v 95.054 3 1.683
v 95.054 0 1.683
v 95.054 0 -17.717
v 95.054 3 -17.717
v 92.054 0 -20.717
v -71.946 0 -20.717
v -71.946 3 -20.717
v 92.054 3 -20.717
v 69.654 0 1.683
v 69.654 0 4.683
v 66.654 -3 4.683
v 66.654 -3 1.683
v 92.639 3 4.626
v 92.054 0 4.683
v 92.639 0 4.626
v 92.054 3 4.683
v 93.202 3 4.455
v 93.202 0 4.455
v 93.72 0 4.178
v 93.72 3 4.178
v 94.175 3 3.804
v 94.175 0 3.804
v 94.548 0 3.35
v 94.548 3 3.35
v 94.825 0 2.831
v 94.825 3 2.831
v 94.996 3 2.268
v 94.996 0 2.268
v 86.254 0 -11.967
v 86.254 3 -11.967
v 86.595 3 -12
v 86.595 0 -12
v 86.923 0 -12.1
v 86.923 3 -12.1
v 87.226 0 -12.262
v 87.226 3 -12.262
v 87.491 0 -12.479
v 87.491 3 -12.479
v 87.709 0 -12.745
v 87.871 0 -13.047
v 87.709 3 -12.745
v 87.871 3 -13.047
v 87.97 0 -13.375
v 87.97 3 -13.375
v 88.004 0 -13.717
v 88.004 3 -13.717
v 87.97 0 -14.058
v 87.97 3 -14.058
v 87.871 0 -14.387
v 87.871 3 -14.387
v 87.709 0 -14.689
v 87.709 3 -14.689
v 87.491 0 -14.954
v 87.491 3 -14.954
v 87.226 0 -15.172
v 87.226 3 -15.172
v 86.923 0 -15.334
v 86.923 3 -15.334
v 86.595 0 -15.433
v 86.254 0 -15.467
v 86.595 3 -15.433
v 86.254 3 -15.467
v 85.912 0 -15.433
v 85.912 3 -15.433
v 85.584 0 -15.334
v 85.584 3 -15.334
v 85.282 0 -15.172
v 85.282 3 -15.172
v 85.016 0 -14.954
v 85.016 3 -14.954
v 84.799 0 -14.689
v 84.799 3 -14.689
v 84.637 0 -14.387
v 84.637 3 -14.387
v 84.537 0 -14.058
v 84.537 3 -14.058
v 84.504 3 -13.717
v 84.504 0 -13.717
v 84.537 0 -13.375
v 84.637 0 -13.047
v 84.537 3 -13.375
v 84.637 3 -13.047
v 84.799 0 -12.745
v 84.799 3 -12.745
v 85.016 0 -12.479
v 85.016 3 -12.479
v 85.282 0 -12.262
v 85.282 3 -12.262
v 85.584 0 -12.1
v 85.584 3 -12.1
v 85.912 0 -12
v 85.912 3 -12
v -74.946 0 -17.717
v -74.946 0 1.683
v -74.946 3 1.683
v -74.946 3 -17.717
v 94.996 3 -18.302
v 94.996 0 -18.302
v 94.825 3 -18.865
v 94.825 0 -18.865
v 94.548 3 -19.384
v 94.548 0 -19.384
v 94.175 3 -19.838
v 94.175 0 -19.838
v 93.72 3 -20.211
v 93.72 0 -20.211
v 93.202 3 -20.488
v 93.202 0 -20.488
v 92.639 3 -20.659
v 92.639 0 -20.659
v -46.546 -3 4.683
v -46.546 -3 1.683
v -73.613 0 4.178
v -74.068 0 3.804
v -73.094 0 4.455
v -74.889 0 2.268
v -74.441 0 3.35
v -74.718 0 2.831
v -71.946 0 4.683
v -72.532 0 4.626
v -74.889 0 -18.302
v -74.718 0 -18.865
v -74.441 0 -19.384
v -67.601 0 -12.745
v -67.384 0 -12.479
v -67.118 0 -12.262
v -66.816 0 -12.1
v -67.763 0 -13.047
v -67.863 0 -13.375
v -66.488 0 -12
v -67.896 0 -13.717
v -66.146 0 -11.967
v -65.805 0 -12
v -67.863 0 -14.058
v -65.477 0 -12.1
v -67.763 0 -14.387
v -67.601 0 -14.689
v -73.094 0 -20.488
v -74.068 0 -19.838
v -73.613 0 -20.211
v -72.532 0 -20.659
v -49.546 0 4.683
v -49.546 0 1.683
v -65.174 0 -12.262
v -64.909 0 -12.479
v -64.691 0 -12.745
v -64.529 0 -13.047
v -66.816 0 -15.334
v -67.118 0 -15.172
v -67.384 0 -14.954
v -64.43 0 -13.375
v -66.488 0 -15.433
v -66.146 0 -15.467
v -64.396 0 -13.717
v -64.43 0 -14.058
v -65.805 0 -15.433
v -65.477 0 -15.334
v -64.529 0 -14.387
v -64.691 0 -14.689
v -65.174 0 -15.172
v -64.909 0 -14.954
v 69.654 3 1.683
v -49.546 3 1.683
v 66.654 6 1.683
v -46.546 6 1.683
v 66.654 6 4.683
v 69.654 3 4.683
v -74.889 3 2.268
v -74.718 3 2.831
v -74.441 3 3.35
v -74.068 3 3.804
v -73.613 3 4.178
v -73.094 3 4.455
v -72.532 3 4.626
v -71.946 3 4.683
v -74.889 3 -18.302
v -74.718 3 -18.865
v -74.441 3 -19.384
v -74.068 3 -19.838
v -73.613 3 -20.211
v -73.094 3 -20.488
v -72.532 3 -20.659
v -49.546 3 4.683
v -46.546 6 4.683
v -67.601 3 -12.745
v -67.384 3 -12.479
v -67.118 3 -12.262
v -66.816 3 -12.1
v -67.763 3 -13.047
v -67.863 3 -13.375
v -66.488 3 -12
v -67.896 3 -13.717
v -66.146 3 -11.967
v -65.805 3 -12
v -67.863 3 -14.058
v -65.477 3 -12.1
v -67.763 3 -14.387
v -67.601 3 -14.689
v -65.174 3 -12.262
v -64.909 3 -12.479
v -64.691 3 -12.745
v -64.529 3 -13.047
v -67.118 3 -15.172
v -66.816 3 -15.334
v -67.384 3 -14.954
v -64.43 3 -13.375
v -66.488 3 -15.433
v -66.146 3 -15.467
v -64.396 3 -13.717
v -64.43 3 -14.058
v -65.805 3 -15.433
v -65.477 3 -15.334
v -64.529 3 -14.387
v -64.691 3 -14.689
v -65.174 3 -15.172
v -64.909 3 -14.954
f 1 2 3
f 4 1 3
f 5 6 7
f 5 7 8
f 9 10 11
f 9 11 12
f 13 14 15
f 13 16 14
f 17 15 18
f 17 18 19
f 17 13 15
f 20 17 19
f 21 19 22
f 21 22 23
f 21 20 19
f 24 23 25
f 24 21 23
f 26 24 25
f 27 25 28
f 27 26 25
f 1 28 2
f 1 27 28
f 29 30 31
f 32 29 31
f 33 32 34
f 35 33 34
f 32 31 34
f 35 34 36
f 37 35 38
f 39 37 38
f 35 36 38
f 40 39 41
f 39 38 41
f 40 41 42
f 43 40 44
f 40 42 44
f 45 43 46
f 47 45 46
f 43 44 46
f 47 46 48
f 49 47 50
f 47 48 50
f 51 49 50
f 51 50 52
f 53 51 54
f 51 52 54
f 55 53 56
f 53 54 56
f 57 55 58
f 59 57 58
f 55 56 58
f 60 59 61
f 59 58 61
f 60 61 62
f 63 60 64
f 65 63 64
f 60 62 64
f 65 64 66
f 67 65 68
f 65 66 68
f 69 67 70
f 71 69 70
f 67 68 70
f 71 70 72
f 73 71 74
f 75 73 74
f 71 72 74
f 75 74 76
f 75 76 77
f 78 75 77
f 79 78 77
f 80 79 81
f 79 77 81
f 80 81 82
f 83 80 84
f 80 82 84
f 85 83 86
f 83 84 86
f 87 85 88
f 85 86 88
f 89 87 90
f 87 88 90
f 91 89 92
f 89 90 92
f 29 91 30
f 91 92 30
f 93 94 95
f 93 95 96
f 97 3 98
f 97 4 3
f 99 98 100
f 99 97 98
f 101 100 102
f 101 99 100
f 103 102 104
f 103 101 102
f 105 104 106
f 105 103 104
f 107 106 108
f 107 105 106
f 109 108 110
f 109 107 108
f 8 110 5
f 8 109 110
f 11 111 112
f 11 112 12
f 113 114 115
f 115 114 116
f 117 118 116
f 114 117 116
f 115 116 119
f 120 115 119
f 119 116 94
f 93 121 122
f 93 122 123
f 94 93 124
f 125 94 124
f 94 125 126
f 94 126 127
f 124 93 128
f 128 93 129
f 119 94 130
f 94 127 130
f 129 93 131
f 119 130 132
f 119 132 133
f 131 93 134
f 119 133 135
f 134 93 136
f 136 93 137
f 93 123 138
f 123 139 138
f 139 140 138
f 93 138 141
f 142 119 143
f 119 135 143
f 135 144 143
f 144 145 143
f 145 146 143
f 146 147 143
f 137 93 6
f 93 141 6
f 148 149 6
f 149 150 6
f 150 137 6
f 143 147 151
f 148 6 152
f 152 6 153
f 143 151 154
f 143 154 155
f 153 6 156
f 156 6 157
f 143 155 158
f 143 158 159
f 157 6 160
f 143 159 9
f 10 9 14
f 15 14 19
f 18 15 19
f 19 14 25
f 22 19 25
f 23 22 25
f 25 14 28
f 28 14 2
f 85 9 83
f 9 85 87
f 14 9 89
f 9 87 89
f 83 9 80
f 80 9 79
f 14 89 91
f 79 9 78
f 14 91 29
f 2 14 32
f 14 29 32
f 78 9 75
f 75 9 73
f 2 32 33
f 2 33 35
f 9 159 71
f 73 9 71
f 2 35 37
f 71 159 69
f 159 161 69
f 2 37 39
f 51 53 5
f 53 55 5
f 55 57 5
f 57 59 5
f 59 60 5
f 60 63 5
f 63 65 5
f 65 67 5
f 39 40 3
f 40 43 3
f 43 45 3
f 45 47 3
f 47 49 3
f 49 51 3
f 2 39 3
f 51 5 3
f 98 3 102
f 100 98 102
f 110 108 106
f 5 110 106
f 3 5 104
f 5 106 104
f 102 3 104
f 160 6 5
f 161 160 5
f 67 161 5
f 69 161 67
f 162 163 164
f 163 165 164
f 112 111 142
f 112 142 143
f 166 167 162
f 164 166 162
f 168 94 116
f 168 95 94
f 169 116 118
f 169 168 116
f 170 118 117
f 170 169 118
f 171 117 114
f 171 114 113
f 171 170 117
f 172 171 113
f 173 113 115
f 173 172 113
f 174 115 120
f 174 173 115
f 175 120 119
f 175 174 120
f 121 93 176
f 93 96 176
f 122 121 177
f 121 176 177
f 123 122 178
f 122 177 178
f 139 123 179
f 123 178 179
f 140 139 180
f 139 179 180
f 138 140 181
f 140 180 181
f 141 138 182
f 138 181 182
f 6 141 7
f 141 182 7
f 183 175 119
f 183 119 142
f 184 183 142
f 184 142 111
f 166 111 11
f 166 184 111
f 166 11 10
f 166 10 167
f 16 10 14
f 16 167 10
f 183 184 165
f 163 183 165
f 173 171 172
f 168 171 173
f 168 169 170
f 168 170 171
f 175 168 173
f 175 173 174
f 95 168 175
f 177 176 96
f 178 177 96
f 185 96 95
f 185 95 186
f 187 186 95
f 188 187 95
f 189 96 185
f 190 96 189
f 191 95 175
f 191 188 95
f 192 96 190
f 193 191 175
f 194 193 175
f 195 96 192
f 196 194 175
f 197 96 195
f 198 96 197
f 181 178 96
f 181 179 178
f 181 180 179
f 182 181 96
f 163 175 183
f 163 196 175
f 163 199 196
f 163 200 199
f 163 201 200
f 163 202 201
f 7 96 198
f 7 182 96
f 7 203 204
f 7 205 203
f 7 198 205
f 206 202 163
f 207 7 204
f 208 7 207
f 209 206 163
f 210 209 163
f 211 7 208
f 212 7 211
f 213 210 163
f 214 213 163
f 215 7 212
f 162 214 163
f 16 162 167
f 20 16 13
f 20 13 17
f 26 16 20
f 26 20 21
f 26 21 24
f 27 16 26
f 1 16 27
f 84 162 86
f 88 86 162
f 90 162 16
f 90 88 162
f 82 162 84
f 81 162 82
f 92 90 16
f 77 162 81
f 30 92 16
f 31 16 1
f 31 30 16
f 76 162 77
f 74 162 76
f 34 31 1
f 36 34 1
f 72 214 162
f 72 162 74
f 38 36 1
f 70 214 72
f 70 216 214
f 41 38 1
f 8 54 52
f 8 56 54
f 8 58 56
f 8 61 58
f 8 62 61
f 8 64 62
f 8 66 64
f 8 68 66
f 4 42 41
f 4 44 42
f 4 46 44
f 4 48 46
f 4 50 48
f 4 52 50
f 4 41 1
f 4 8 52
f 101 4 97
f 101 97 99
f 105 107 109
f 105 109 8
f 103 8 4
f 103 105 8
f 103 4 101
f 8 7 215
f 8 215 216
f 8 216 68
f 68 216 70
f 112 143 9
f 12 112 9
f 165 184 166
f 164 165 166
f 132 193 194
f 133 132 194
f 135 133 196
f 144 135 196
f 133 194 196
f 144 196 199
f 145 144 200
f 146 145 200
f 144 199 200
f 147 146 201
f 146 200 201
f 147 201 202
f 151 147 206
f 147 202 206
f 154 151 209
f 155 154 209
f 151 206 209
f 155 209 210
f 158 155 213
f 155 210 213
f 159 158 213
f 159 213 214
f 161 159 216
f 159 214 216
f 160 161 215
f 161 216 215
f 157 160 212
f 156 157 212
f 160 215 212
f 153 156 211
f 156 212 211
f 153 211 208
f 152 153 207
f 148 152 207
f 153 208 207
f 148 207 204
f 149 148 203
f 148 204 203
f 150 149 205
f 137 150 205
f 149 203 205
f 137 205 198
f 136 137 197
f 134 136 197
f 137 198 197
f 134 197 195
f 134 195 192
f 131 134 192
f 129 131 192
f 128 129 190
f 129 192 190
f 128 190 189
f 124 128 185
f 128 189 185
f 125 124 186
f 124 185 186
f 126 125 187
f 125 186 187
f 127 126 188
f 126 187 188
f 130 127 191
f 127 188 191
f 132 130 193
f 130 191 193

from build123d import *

# Parameters (mm, degrees)
SKETCH1_W           = 170
SKETCH1_H           = 25.4
BOSS_EXTRUDE1_DEPTH = 3
FILLET1_R           = 3
SKETCH2_R           = 1.75
CUT_EXTRUDE1_DEPTH  = 3
SKETCH3_W           = 119.2
SKETCH3_H           = 9
BOSS_EXTRUDE2_DEPTH = 3
CHAMFER1_SIZE       = 3


with BuildPart() as part:
    # Sketch1 → Boss-Extrude1 (new body)
    with BuildSketch(Plane(origin=(0, 0, 0), x_dir=(1, 0, 0), z_dir=(0, 1, 0))):
        with Locations((10.053763441, 8.016845878)):
            Rectangle(SKETCH1_W, SKETCH1_H)
    extrude(amount=BOSS_EXTRUDE1_DEPTH)

    # Fillet1
    fillet1_edges = [part.edges().sort_by_distance(p)[0] for p in [
        (-74.946236559, 1.5, -20.716845878),
        (95.053763441, 1.5, -20.716845878),
        (95.053763441, 1.5, 4.683154122),
        (-74.946236559, 1.5, 4.683154122),
    ]]
    fillet(fillet1_edges, radius=FILLET1_R)

    # Sketch2 → Cut-Extrude1 (cut)
    with BuildSketch(Plane(origin=(0, 3, 0), x_dir=(1, 0, 0), z_dir=(0, 1, 0))):
        with Locations(Location((86.253763441, 13.716845878, 0), (0, 0, 270))):
            Circle(SKETCH2_R)
        with Locations(Location((-66.146236559, 13.716845878, 0), (0, 0, 270))):
            Circle(SKETCH2_R)
    extrude(amount=-CUT_EXTRUDE1_DEPTH, mode=Mode.SUBTRACT)

    # Sketch3 → Boss-Extrude2 (add)
    with BuildSketch(Plane.XY.offset(4.683154122)):
        with Locations((10.053763441, 1.5)):
            Rectangle(SKETCH3_W, SKETCH3_H)
    extrude(amount=-BOSS_EXTRUDE2_DEPTH)

    # Chamfer1
    chamfer1_edges = [part.edges().sort_by_distance(p)[0] for p in [
        (-49.546236559, -3, 3.183154122),
        (69.653763441, -3, 3.183154122),
        (69.653763441, 6, 3.183154122),
        (-49.546236559, 6, 3.183154122),
    ]]
    chamfer(chamfer1_edges, length=CHAMFER1_SIZE - 0.0001)  # a hair under: the kernel refuses the full size


solid = part.part
